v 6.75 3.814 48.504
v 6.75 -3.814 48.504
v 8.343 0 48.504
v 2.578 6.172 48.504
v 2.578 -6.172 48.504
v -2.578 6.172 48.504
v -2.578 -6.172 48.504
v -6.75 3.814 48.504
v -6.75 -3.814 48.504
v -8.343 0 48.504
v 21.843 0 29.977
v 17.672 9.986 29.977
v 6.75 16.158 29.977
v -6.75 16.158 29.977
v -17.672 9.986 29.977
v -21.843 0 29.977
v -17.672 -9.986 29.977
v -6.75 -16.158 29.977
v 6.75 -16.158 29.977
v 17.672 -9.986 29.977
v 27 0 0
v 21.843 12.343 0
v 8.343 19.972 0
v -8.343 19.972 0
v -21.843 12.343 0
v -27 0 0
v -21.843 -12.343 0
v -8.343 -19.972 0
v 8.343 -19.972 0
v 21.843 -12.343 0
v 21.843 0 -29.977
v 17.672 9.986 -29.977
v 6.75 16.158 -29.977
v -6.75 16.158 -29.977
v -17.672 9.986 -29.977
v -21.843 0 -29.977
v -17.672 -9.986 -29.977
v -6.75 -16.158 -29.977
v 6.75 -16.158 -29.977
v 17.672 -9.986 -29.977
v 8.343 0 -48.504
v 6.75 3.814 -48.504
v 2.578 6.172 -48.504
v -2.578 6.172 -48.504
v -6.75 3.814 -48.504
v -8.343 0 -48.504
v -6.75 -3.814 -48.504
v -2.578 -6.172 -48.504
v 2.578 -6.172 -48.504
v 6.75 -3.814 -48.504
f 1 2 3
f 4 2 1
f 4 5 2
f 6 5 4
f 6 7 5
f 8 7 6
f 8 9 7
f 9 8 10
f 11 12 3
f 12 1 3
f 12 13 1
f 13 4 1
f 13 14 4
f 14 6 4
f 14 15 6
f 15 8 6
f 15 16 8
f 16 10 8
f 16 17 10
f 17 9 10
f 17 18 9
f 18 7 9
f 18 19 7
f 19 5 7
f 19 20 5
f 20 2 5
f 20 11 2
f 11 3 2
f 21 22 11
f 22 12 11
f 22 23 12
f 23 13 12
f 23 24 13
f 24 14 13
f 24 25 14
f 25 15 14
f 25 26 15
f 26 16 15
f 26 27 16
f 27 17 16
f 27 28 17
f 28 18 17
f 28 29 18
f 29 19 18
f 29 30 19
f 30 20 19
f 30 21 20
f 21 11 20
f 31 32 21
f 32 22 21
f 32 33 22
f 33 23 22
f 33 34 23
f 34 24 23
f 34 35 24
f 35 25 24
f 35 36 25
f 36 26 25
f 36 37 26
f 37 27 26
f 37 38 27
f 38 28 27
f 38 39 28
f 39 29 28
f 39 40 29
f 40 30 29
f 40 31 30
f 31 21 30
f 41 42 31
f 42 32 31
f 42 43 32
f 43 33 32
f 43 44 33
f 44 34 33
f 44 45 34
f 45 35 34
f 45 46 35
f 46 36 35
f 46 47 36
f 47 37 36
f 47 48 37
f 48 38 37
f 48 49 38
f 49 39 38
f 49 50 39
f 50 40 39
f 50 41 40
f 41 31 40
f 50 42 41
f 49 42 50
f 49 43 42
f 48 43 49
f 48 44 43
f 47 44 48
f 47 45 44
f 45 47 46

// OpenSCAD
// Generated by SolidPython 1.0.1 on 2020-07-29 00:46:48


scale(v = [9, 7, 17]) {
	sphere(r = 3);
}
/***********************************************
*********      SolidPython code:      **********
************************************************
 
# import packages: SolidPython
from solid import *
from solid.utils import *
from itertools import chain, combinations, permutations


class Resize:

    def __init__(self, scad_file):
        self.scad_file = scad_file
        #self.scad_file = import_scad(scad_file)
        # cone/cylinder param:
        self.r1 = 0
        self.r2 = 0
        self.h = 0
        # rectangular prism param:
        self.w = 0
        self.l = 0
        # ellipse param:
        self.r = 0

    # import OpenScad code (file name corresponds to shape)


    # classify shape + parameters
    def assign(self, param1, param2, param3):
        if self.scad_file == 'cone.scad':
            self.r1 = param1
            self.r2 = param2
            self.h = param3
        elif self.scad_file == 'cylinder.scad':
            self.r1 = param1
            self.r2 = param2
            self.h = param3
        elif self.scad_file == 'rectangularPrism.scad':
            self.h = param1
            self.l = param2
            self.w = param3
        else:
            self.r = param1
            self.h = param2

    # resize parameters
    def iterate(self):
        x = range(3, 20, 2)
        i = 1
        if self.scad_file == 'cone.scad':
            tempList = list(permutations(x, 2))
            for temp in tempList:
                param1 = temp[0]
                param2 = temp[1]
                filepath = 'produced_scad_files/' + 'cone' + str(param1) + '_' + str(param2) + '_' + '.scad'
                scad_render_to_file(cylinder(h=param1, r1=param2, r2=0), filepath)

        elif self.scad_file == 'cylinder.scad':
            tempList = list(permutations(x, 3))
            for temp in tempList:
                param1 = temp[0]
                param2 = temp[1]
                filepath = 'produced_scad_files/' + 'cylinder' + str(param1) + '_' + str(param2) + '_' + '.scad'
                scad_render_to_file(cylinder(h=param1, r1=param2, r2=param2), filepath)

        elif self.scad_file == 'rectangularPrism.scad':
            tempList = list(permutations(x, 3))
            for temp in tempList:
                param1 = temp[0]
                param2 = temp[1]
                param3 = temp[2]
                filepath = 'produced_scad_files/' + 'rectangularPrism' + str(param1) + '_' + str(param2) + '_' + str(
                    param3) + '.scad'
                scad_render_to_file(cube(size=(param1, param2, param3)), filepath)

        elif self.scad_file == 'ellipse.scad':
            tempList = list(permutations(x, 4))
            for temp in tempList:
                param1 = temp[0]
                param2 = temp[1]
                param3 = temp[2]
                param4 = temp[3]
                filepath = 'produced_scad_files/' + 'ellipse' + str(param1) + '_' + str(param2) + '_' + str(param3) + '_' + str(param4) + '.scad'
                scad_render_to_file(scale([param1, param2, param3])(sphere(r=param4)), filepath)

    def render_to_scadfile(self):
        scad_render_to_file(scad, 'example.scad') 
 
************************************************/
